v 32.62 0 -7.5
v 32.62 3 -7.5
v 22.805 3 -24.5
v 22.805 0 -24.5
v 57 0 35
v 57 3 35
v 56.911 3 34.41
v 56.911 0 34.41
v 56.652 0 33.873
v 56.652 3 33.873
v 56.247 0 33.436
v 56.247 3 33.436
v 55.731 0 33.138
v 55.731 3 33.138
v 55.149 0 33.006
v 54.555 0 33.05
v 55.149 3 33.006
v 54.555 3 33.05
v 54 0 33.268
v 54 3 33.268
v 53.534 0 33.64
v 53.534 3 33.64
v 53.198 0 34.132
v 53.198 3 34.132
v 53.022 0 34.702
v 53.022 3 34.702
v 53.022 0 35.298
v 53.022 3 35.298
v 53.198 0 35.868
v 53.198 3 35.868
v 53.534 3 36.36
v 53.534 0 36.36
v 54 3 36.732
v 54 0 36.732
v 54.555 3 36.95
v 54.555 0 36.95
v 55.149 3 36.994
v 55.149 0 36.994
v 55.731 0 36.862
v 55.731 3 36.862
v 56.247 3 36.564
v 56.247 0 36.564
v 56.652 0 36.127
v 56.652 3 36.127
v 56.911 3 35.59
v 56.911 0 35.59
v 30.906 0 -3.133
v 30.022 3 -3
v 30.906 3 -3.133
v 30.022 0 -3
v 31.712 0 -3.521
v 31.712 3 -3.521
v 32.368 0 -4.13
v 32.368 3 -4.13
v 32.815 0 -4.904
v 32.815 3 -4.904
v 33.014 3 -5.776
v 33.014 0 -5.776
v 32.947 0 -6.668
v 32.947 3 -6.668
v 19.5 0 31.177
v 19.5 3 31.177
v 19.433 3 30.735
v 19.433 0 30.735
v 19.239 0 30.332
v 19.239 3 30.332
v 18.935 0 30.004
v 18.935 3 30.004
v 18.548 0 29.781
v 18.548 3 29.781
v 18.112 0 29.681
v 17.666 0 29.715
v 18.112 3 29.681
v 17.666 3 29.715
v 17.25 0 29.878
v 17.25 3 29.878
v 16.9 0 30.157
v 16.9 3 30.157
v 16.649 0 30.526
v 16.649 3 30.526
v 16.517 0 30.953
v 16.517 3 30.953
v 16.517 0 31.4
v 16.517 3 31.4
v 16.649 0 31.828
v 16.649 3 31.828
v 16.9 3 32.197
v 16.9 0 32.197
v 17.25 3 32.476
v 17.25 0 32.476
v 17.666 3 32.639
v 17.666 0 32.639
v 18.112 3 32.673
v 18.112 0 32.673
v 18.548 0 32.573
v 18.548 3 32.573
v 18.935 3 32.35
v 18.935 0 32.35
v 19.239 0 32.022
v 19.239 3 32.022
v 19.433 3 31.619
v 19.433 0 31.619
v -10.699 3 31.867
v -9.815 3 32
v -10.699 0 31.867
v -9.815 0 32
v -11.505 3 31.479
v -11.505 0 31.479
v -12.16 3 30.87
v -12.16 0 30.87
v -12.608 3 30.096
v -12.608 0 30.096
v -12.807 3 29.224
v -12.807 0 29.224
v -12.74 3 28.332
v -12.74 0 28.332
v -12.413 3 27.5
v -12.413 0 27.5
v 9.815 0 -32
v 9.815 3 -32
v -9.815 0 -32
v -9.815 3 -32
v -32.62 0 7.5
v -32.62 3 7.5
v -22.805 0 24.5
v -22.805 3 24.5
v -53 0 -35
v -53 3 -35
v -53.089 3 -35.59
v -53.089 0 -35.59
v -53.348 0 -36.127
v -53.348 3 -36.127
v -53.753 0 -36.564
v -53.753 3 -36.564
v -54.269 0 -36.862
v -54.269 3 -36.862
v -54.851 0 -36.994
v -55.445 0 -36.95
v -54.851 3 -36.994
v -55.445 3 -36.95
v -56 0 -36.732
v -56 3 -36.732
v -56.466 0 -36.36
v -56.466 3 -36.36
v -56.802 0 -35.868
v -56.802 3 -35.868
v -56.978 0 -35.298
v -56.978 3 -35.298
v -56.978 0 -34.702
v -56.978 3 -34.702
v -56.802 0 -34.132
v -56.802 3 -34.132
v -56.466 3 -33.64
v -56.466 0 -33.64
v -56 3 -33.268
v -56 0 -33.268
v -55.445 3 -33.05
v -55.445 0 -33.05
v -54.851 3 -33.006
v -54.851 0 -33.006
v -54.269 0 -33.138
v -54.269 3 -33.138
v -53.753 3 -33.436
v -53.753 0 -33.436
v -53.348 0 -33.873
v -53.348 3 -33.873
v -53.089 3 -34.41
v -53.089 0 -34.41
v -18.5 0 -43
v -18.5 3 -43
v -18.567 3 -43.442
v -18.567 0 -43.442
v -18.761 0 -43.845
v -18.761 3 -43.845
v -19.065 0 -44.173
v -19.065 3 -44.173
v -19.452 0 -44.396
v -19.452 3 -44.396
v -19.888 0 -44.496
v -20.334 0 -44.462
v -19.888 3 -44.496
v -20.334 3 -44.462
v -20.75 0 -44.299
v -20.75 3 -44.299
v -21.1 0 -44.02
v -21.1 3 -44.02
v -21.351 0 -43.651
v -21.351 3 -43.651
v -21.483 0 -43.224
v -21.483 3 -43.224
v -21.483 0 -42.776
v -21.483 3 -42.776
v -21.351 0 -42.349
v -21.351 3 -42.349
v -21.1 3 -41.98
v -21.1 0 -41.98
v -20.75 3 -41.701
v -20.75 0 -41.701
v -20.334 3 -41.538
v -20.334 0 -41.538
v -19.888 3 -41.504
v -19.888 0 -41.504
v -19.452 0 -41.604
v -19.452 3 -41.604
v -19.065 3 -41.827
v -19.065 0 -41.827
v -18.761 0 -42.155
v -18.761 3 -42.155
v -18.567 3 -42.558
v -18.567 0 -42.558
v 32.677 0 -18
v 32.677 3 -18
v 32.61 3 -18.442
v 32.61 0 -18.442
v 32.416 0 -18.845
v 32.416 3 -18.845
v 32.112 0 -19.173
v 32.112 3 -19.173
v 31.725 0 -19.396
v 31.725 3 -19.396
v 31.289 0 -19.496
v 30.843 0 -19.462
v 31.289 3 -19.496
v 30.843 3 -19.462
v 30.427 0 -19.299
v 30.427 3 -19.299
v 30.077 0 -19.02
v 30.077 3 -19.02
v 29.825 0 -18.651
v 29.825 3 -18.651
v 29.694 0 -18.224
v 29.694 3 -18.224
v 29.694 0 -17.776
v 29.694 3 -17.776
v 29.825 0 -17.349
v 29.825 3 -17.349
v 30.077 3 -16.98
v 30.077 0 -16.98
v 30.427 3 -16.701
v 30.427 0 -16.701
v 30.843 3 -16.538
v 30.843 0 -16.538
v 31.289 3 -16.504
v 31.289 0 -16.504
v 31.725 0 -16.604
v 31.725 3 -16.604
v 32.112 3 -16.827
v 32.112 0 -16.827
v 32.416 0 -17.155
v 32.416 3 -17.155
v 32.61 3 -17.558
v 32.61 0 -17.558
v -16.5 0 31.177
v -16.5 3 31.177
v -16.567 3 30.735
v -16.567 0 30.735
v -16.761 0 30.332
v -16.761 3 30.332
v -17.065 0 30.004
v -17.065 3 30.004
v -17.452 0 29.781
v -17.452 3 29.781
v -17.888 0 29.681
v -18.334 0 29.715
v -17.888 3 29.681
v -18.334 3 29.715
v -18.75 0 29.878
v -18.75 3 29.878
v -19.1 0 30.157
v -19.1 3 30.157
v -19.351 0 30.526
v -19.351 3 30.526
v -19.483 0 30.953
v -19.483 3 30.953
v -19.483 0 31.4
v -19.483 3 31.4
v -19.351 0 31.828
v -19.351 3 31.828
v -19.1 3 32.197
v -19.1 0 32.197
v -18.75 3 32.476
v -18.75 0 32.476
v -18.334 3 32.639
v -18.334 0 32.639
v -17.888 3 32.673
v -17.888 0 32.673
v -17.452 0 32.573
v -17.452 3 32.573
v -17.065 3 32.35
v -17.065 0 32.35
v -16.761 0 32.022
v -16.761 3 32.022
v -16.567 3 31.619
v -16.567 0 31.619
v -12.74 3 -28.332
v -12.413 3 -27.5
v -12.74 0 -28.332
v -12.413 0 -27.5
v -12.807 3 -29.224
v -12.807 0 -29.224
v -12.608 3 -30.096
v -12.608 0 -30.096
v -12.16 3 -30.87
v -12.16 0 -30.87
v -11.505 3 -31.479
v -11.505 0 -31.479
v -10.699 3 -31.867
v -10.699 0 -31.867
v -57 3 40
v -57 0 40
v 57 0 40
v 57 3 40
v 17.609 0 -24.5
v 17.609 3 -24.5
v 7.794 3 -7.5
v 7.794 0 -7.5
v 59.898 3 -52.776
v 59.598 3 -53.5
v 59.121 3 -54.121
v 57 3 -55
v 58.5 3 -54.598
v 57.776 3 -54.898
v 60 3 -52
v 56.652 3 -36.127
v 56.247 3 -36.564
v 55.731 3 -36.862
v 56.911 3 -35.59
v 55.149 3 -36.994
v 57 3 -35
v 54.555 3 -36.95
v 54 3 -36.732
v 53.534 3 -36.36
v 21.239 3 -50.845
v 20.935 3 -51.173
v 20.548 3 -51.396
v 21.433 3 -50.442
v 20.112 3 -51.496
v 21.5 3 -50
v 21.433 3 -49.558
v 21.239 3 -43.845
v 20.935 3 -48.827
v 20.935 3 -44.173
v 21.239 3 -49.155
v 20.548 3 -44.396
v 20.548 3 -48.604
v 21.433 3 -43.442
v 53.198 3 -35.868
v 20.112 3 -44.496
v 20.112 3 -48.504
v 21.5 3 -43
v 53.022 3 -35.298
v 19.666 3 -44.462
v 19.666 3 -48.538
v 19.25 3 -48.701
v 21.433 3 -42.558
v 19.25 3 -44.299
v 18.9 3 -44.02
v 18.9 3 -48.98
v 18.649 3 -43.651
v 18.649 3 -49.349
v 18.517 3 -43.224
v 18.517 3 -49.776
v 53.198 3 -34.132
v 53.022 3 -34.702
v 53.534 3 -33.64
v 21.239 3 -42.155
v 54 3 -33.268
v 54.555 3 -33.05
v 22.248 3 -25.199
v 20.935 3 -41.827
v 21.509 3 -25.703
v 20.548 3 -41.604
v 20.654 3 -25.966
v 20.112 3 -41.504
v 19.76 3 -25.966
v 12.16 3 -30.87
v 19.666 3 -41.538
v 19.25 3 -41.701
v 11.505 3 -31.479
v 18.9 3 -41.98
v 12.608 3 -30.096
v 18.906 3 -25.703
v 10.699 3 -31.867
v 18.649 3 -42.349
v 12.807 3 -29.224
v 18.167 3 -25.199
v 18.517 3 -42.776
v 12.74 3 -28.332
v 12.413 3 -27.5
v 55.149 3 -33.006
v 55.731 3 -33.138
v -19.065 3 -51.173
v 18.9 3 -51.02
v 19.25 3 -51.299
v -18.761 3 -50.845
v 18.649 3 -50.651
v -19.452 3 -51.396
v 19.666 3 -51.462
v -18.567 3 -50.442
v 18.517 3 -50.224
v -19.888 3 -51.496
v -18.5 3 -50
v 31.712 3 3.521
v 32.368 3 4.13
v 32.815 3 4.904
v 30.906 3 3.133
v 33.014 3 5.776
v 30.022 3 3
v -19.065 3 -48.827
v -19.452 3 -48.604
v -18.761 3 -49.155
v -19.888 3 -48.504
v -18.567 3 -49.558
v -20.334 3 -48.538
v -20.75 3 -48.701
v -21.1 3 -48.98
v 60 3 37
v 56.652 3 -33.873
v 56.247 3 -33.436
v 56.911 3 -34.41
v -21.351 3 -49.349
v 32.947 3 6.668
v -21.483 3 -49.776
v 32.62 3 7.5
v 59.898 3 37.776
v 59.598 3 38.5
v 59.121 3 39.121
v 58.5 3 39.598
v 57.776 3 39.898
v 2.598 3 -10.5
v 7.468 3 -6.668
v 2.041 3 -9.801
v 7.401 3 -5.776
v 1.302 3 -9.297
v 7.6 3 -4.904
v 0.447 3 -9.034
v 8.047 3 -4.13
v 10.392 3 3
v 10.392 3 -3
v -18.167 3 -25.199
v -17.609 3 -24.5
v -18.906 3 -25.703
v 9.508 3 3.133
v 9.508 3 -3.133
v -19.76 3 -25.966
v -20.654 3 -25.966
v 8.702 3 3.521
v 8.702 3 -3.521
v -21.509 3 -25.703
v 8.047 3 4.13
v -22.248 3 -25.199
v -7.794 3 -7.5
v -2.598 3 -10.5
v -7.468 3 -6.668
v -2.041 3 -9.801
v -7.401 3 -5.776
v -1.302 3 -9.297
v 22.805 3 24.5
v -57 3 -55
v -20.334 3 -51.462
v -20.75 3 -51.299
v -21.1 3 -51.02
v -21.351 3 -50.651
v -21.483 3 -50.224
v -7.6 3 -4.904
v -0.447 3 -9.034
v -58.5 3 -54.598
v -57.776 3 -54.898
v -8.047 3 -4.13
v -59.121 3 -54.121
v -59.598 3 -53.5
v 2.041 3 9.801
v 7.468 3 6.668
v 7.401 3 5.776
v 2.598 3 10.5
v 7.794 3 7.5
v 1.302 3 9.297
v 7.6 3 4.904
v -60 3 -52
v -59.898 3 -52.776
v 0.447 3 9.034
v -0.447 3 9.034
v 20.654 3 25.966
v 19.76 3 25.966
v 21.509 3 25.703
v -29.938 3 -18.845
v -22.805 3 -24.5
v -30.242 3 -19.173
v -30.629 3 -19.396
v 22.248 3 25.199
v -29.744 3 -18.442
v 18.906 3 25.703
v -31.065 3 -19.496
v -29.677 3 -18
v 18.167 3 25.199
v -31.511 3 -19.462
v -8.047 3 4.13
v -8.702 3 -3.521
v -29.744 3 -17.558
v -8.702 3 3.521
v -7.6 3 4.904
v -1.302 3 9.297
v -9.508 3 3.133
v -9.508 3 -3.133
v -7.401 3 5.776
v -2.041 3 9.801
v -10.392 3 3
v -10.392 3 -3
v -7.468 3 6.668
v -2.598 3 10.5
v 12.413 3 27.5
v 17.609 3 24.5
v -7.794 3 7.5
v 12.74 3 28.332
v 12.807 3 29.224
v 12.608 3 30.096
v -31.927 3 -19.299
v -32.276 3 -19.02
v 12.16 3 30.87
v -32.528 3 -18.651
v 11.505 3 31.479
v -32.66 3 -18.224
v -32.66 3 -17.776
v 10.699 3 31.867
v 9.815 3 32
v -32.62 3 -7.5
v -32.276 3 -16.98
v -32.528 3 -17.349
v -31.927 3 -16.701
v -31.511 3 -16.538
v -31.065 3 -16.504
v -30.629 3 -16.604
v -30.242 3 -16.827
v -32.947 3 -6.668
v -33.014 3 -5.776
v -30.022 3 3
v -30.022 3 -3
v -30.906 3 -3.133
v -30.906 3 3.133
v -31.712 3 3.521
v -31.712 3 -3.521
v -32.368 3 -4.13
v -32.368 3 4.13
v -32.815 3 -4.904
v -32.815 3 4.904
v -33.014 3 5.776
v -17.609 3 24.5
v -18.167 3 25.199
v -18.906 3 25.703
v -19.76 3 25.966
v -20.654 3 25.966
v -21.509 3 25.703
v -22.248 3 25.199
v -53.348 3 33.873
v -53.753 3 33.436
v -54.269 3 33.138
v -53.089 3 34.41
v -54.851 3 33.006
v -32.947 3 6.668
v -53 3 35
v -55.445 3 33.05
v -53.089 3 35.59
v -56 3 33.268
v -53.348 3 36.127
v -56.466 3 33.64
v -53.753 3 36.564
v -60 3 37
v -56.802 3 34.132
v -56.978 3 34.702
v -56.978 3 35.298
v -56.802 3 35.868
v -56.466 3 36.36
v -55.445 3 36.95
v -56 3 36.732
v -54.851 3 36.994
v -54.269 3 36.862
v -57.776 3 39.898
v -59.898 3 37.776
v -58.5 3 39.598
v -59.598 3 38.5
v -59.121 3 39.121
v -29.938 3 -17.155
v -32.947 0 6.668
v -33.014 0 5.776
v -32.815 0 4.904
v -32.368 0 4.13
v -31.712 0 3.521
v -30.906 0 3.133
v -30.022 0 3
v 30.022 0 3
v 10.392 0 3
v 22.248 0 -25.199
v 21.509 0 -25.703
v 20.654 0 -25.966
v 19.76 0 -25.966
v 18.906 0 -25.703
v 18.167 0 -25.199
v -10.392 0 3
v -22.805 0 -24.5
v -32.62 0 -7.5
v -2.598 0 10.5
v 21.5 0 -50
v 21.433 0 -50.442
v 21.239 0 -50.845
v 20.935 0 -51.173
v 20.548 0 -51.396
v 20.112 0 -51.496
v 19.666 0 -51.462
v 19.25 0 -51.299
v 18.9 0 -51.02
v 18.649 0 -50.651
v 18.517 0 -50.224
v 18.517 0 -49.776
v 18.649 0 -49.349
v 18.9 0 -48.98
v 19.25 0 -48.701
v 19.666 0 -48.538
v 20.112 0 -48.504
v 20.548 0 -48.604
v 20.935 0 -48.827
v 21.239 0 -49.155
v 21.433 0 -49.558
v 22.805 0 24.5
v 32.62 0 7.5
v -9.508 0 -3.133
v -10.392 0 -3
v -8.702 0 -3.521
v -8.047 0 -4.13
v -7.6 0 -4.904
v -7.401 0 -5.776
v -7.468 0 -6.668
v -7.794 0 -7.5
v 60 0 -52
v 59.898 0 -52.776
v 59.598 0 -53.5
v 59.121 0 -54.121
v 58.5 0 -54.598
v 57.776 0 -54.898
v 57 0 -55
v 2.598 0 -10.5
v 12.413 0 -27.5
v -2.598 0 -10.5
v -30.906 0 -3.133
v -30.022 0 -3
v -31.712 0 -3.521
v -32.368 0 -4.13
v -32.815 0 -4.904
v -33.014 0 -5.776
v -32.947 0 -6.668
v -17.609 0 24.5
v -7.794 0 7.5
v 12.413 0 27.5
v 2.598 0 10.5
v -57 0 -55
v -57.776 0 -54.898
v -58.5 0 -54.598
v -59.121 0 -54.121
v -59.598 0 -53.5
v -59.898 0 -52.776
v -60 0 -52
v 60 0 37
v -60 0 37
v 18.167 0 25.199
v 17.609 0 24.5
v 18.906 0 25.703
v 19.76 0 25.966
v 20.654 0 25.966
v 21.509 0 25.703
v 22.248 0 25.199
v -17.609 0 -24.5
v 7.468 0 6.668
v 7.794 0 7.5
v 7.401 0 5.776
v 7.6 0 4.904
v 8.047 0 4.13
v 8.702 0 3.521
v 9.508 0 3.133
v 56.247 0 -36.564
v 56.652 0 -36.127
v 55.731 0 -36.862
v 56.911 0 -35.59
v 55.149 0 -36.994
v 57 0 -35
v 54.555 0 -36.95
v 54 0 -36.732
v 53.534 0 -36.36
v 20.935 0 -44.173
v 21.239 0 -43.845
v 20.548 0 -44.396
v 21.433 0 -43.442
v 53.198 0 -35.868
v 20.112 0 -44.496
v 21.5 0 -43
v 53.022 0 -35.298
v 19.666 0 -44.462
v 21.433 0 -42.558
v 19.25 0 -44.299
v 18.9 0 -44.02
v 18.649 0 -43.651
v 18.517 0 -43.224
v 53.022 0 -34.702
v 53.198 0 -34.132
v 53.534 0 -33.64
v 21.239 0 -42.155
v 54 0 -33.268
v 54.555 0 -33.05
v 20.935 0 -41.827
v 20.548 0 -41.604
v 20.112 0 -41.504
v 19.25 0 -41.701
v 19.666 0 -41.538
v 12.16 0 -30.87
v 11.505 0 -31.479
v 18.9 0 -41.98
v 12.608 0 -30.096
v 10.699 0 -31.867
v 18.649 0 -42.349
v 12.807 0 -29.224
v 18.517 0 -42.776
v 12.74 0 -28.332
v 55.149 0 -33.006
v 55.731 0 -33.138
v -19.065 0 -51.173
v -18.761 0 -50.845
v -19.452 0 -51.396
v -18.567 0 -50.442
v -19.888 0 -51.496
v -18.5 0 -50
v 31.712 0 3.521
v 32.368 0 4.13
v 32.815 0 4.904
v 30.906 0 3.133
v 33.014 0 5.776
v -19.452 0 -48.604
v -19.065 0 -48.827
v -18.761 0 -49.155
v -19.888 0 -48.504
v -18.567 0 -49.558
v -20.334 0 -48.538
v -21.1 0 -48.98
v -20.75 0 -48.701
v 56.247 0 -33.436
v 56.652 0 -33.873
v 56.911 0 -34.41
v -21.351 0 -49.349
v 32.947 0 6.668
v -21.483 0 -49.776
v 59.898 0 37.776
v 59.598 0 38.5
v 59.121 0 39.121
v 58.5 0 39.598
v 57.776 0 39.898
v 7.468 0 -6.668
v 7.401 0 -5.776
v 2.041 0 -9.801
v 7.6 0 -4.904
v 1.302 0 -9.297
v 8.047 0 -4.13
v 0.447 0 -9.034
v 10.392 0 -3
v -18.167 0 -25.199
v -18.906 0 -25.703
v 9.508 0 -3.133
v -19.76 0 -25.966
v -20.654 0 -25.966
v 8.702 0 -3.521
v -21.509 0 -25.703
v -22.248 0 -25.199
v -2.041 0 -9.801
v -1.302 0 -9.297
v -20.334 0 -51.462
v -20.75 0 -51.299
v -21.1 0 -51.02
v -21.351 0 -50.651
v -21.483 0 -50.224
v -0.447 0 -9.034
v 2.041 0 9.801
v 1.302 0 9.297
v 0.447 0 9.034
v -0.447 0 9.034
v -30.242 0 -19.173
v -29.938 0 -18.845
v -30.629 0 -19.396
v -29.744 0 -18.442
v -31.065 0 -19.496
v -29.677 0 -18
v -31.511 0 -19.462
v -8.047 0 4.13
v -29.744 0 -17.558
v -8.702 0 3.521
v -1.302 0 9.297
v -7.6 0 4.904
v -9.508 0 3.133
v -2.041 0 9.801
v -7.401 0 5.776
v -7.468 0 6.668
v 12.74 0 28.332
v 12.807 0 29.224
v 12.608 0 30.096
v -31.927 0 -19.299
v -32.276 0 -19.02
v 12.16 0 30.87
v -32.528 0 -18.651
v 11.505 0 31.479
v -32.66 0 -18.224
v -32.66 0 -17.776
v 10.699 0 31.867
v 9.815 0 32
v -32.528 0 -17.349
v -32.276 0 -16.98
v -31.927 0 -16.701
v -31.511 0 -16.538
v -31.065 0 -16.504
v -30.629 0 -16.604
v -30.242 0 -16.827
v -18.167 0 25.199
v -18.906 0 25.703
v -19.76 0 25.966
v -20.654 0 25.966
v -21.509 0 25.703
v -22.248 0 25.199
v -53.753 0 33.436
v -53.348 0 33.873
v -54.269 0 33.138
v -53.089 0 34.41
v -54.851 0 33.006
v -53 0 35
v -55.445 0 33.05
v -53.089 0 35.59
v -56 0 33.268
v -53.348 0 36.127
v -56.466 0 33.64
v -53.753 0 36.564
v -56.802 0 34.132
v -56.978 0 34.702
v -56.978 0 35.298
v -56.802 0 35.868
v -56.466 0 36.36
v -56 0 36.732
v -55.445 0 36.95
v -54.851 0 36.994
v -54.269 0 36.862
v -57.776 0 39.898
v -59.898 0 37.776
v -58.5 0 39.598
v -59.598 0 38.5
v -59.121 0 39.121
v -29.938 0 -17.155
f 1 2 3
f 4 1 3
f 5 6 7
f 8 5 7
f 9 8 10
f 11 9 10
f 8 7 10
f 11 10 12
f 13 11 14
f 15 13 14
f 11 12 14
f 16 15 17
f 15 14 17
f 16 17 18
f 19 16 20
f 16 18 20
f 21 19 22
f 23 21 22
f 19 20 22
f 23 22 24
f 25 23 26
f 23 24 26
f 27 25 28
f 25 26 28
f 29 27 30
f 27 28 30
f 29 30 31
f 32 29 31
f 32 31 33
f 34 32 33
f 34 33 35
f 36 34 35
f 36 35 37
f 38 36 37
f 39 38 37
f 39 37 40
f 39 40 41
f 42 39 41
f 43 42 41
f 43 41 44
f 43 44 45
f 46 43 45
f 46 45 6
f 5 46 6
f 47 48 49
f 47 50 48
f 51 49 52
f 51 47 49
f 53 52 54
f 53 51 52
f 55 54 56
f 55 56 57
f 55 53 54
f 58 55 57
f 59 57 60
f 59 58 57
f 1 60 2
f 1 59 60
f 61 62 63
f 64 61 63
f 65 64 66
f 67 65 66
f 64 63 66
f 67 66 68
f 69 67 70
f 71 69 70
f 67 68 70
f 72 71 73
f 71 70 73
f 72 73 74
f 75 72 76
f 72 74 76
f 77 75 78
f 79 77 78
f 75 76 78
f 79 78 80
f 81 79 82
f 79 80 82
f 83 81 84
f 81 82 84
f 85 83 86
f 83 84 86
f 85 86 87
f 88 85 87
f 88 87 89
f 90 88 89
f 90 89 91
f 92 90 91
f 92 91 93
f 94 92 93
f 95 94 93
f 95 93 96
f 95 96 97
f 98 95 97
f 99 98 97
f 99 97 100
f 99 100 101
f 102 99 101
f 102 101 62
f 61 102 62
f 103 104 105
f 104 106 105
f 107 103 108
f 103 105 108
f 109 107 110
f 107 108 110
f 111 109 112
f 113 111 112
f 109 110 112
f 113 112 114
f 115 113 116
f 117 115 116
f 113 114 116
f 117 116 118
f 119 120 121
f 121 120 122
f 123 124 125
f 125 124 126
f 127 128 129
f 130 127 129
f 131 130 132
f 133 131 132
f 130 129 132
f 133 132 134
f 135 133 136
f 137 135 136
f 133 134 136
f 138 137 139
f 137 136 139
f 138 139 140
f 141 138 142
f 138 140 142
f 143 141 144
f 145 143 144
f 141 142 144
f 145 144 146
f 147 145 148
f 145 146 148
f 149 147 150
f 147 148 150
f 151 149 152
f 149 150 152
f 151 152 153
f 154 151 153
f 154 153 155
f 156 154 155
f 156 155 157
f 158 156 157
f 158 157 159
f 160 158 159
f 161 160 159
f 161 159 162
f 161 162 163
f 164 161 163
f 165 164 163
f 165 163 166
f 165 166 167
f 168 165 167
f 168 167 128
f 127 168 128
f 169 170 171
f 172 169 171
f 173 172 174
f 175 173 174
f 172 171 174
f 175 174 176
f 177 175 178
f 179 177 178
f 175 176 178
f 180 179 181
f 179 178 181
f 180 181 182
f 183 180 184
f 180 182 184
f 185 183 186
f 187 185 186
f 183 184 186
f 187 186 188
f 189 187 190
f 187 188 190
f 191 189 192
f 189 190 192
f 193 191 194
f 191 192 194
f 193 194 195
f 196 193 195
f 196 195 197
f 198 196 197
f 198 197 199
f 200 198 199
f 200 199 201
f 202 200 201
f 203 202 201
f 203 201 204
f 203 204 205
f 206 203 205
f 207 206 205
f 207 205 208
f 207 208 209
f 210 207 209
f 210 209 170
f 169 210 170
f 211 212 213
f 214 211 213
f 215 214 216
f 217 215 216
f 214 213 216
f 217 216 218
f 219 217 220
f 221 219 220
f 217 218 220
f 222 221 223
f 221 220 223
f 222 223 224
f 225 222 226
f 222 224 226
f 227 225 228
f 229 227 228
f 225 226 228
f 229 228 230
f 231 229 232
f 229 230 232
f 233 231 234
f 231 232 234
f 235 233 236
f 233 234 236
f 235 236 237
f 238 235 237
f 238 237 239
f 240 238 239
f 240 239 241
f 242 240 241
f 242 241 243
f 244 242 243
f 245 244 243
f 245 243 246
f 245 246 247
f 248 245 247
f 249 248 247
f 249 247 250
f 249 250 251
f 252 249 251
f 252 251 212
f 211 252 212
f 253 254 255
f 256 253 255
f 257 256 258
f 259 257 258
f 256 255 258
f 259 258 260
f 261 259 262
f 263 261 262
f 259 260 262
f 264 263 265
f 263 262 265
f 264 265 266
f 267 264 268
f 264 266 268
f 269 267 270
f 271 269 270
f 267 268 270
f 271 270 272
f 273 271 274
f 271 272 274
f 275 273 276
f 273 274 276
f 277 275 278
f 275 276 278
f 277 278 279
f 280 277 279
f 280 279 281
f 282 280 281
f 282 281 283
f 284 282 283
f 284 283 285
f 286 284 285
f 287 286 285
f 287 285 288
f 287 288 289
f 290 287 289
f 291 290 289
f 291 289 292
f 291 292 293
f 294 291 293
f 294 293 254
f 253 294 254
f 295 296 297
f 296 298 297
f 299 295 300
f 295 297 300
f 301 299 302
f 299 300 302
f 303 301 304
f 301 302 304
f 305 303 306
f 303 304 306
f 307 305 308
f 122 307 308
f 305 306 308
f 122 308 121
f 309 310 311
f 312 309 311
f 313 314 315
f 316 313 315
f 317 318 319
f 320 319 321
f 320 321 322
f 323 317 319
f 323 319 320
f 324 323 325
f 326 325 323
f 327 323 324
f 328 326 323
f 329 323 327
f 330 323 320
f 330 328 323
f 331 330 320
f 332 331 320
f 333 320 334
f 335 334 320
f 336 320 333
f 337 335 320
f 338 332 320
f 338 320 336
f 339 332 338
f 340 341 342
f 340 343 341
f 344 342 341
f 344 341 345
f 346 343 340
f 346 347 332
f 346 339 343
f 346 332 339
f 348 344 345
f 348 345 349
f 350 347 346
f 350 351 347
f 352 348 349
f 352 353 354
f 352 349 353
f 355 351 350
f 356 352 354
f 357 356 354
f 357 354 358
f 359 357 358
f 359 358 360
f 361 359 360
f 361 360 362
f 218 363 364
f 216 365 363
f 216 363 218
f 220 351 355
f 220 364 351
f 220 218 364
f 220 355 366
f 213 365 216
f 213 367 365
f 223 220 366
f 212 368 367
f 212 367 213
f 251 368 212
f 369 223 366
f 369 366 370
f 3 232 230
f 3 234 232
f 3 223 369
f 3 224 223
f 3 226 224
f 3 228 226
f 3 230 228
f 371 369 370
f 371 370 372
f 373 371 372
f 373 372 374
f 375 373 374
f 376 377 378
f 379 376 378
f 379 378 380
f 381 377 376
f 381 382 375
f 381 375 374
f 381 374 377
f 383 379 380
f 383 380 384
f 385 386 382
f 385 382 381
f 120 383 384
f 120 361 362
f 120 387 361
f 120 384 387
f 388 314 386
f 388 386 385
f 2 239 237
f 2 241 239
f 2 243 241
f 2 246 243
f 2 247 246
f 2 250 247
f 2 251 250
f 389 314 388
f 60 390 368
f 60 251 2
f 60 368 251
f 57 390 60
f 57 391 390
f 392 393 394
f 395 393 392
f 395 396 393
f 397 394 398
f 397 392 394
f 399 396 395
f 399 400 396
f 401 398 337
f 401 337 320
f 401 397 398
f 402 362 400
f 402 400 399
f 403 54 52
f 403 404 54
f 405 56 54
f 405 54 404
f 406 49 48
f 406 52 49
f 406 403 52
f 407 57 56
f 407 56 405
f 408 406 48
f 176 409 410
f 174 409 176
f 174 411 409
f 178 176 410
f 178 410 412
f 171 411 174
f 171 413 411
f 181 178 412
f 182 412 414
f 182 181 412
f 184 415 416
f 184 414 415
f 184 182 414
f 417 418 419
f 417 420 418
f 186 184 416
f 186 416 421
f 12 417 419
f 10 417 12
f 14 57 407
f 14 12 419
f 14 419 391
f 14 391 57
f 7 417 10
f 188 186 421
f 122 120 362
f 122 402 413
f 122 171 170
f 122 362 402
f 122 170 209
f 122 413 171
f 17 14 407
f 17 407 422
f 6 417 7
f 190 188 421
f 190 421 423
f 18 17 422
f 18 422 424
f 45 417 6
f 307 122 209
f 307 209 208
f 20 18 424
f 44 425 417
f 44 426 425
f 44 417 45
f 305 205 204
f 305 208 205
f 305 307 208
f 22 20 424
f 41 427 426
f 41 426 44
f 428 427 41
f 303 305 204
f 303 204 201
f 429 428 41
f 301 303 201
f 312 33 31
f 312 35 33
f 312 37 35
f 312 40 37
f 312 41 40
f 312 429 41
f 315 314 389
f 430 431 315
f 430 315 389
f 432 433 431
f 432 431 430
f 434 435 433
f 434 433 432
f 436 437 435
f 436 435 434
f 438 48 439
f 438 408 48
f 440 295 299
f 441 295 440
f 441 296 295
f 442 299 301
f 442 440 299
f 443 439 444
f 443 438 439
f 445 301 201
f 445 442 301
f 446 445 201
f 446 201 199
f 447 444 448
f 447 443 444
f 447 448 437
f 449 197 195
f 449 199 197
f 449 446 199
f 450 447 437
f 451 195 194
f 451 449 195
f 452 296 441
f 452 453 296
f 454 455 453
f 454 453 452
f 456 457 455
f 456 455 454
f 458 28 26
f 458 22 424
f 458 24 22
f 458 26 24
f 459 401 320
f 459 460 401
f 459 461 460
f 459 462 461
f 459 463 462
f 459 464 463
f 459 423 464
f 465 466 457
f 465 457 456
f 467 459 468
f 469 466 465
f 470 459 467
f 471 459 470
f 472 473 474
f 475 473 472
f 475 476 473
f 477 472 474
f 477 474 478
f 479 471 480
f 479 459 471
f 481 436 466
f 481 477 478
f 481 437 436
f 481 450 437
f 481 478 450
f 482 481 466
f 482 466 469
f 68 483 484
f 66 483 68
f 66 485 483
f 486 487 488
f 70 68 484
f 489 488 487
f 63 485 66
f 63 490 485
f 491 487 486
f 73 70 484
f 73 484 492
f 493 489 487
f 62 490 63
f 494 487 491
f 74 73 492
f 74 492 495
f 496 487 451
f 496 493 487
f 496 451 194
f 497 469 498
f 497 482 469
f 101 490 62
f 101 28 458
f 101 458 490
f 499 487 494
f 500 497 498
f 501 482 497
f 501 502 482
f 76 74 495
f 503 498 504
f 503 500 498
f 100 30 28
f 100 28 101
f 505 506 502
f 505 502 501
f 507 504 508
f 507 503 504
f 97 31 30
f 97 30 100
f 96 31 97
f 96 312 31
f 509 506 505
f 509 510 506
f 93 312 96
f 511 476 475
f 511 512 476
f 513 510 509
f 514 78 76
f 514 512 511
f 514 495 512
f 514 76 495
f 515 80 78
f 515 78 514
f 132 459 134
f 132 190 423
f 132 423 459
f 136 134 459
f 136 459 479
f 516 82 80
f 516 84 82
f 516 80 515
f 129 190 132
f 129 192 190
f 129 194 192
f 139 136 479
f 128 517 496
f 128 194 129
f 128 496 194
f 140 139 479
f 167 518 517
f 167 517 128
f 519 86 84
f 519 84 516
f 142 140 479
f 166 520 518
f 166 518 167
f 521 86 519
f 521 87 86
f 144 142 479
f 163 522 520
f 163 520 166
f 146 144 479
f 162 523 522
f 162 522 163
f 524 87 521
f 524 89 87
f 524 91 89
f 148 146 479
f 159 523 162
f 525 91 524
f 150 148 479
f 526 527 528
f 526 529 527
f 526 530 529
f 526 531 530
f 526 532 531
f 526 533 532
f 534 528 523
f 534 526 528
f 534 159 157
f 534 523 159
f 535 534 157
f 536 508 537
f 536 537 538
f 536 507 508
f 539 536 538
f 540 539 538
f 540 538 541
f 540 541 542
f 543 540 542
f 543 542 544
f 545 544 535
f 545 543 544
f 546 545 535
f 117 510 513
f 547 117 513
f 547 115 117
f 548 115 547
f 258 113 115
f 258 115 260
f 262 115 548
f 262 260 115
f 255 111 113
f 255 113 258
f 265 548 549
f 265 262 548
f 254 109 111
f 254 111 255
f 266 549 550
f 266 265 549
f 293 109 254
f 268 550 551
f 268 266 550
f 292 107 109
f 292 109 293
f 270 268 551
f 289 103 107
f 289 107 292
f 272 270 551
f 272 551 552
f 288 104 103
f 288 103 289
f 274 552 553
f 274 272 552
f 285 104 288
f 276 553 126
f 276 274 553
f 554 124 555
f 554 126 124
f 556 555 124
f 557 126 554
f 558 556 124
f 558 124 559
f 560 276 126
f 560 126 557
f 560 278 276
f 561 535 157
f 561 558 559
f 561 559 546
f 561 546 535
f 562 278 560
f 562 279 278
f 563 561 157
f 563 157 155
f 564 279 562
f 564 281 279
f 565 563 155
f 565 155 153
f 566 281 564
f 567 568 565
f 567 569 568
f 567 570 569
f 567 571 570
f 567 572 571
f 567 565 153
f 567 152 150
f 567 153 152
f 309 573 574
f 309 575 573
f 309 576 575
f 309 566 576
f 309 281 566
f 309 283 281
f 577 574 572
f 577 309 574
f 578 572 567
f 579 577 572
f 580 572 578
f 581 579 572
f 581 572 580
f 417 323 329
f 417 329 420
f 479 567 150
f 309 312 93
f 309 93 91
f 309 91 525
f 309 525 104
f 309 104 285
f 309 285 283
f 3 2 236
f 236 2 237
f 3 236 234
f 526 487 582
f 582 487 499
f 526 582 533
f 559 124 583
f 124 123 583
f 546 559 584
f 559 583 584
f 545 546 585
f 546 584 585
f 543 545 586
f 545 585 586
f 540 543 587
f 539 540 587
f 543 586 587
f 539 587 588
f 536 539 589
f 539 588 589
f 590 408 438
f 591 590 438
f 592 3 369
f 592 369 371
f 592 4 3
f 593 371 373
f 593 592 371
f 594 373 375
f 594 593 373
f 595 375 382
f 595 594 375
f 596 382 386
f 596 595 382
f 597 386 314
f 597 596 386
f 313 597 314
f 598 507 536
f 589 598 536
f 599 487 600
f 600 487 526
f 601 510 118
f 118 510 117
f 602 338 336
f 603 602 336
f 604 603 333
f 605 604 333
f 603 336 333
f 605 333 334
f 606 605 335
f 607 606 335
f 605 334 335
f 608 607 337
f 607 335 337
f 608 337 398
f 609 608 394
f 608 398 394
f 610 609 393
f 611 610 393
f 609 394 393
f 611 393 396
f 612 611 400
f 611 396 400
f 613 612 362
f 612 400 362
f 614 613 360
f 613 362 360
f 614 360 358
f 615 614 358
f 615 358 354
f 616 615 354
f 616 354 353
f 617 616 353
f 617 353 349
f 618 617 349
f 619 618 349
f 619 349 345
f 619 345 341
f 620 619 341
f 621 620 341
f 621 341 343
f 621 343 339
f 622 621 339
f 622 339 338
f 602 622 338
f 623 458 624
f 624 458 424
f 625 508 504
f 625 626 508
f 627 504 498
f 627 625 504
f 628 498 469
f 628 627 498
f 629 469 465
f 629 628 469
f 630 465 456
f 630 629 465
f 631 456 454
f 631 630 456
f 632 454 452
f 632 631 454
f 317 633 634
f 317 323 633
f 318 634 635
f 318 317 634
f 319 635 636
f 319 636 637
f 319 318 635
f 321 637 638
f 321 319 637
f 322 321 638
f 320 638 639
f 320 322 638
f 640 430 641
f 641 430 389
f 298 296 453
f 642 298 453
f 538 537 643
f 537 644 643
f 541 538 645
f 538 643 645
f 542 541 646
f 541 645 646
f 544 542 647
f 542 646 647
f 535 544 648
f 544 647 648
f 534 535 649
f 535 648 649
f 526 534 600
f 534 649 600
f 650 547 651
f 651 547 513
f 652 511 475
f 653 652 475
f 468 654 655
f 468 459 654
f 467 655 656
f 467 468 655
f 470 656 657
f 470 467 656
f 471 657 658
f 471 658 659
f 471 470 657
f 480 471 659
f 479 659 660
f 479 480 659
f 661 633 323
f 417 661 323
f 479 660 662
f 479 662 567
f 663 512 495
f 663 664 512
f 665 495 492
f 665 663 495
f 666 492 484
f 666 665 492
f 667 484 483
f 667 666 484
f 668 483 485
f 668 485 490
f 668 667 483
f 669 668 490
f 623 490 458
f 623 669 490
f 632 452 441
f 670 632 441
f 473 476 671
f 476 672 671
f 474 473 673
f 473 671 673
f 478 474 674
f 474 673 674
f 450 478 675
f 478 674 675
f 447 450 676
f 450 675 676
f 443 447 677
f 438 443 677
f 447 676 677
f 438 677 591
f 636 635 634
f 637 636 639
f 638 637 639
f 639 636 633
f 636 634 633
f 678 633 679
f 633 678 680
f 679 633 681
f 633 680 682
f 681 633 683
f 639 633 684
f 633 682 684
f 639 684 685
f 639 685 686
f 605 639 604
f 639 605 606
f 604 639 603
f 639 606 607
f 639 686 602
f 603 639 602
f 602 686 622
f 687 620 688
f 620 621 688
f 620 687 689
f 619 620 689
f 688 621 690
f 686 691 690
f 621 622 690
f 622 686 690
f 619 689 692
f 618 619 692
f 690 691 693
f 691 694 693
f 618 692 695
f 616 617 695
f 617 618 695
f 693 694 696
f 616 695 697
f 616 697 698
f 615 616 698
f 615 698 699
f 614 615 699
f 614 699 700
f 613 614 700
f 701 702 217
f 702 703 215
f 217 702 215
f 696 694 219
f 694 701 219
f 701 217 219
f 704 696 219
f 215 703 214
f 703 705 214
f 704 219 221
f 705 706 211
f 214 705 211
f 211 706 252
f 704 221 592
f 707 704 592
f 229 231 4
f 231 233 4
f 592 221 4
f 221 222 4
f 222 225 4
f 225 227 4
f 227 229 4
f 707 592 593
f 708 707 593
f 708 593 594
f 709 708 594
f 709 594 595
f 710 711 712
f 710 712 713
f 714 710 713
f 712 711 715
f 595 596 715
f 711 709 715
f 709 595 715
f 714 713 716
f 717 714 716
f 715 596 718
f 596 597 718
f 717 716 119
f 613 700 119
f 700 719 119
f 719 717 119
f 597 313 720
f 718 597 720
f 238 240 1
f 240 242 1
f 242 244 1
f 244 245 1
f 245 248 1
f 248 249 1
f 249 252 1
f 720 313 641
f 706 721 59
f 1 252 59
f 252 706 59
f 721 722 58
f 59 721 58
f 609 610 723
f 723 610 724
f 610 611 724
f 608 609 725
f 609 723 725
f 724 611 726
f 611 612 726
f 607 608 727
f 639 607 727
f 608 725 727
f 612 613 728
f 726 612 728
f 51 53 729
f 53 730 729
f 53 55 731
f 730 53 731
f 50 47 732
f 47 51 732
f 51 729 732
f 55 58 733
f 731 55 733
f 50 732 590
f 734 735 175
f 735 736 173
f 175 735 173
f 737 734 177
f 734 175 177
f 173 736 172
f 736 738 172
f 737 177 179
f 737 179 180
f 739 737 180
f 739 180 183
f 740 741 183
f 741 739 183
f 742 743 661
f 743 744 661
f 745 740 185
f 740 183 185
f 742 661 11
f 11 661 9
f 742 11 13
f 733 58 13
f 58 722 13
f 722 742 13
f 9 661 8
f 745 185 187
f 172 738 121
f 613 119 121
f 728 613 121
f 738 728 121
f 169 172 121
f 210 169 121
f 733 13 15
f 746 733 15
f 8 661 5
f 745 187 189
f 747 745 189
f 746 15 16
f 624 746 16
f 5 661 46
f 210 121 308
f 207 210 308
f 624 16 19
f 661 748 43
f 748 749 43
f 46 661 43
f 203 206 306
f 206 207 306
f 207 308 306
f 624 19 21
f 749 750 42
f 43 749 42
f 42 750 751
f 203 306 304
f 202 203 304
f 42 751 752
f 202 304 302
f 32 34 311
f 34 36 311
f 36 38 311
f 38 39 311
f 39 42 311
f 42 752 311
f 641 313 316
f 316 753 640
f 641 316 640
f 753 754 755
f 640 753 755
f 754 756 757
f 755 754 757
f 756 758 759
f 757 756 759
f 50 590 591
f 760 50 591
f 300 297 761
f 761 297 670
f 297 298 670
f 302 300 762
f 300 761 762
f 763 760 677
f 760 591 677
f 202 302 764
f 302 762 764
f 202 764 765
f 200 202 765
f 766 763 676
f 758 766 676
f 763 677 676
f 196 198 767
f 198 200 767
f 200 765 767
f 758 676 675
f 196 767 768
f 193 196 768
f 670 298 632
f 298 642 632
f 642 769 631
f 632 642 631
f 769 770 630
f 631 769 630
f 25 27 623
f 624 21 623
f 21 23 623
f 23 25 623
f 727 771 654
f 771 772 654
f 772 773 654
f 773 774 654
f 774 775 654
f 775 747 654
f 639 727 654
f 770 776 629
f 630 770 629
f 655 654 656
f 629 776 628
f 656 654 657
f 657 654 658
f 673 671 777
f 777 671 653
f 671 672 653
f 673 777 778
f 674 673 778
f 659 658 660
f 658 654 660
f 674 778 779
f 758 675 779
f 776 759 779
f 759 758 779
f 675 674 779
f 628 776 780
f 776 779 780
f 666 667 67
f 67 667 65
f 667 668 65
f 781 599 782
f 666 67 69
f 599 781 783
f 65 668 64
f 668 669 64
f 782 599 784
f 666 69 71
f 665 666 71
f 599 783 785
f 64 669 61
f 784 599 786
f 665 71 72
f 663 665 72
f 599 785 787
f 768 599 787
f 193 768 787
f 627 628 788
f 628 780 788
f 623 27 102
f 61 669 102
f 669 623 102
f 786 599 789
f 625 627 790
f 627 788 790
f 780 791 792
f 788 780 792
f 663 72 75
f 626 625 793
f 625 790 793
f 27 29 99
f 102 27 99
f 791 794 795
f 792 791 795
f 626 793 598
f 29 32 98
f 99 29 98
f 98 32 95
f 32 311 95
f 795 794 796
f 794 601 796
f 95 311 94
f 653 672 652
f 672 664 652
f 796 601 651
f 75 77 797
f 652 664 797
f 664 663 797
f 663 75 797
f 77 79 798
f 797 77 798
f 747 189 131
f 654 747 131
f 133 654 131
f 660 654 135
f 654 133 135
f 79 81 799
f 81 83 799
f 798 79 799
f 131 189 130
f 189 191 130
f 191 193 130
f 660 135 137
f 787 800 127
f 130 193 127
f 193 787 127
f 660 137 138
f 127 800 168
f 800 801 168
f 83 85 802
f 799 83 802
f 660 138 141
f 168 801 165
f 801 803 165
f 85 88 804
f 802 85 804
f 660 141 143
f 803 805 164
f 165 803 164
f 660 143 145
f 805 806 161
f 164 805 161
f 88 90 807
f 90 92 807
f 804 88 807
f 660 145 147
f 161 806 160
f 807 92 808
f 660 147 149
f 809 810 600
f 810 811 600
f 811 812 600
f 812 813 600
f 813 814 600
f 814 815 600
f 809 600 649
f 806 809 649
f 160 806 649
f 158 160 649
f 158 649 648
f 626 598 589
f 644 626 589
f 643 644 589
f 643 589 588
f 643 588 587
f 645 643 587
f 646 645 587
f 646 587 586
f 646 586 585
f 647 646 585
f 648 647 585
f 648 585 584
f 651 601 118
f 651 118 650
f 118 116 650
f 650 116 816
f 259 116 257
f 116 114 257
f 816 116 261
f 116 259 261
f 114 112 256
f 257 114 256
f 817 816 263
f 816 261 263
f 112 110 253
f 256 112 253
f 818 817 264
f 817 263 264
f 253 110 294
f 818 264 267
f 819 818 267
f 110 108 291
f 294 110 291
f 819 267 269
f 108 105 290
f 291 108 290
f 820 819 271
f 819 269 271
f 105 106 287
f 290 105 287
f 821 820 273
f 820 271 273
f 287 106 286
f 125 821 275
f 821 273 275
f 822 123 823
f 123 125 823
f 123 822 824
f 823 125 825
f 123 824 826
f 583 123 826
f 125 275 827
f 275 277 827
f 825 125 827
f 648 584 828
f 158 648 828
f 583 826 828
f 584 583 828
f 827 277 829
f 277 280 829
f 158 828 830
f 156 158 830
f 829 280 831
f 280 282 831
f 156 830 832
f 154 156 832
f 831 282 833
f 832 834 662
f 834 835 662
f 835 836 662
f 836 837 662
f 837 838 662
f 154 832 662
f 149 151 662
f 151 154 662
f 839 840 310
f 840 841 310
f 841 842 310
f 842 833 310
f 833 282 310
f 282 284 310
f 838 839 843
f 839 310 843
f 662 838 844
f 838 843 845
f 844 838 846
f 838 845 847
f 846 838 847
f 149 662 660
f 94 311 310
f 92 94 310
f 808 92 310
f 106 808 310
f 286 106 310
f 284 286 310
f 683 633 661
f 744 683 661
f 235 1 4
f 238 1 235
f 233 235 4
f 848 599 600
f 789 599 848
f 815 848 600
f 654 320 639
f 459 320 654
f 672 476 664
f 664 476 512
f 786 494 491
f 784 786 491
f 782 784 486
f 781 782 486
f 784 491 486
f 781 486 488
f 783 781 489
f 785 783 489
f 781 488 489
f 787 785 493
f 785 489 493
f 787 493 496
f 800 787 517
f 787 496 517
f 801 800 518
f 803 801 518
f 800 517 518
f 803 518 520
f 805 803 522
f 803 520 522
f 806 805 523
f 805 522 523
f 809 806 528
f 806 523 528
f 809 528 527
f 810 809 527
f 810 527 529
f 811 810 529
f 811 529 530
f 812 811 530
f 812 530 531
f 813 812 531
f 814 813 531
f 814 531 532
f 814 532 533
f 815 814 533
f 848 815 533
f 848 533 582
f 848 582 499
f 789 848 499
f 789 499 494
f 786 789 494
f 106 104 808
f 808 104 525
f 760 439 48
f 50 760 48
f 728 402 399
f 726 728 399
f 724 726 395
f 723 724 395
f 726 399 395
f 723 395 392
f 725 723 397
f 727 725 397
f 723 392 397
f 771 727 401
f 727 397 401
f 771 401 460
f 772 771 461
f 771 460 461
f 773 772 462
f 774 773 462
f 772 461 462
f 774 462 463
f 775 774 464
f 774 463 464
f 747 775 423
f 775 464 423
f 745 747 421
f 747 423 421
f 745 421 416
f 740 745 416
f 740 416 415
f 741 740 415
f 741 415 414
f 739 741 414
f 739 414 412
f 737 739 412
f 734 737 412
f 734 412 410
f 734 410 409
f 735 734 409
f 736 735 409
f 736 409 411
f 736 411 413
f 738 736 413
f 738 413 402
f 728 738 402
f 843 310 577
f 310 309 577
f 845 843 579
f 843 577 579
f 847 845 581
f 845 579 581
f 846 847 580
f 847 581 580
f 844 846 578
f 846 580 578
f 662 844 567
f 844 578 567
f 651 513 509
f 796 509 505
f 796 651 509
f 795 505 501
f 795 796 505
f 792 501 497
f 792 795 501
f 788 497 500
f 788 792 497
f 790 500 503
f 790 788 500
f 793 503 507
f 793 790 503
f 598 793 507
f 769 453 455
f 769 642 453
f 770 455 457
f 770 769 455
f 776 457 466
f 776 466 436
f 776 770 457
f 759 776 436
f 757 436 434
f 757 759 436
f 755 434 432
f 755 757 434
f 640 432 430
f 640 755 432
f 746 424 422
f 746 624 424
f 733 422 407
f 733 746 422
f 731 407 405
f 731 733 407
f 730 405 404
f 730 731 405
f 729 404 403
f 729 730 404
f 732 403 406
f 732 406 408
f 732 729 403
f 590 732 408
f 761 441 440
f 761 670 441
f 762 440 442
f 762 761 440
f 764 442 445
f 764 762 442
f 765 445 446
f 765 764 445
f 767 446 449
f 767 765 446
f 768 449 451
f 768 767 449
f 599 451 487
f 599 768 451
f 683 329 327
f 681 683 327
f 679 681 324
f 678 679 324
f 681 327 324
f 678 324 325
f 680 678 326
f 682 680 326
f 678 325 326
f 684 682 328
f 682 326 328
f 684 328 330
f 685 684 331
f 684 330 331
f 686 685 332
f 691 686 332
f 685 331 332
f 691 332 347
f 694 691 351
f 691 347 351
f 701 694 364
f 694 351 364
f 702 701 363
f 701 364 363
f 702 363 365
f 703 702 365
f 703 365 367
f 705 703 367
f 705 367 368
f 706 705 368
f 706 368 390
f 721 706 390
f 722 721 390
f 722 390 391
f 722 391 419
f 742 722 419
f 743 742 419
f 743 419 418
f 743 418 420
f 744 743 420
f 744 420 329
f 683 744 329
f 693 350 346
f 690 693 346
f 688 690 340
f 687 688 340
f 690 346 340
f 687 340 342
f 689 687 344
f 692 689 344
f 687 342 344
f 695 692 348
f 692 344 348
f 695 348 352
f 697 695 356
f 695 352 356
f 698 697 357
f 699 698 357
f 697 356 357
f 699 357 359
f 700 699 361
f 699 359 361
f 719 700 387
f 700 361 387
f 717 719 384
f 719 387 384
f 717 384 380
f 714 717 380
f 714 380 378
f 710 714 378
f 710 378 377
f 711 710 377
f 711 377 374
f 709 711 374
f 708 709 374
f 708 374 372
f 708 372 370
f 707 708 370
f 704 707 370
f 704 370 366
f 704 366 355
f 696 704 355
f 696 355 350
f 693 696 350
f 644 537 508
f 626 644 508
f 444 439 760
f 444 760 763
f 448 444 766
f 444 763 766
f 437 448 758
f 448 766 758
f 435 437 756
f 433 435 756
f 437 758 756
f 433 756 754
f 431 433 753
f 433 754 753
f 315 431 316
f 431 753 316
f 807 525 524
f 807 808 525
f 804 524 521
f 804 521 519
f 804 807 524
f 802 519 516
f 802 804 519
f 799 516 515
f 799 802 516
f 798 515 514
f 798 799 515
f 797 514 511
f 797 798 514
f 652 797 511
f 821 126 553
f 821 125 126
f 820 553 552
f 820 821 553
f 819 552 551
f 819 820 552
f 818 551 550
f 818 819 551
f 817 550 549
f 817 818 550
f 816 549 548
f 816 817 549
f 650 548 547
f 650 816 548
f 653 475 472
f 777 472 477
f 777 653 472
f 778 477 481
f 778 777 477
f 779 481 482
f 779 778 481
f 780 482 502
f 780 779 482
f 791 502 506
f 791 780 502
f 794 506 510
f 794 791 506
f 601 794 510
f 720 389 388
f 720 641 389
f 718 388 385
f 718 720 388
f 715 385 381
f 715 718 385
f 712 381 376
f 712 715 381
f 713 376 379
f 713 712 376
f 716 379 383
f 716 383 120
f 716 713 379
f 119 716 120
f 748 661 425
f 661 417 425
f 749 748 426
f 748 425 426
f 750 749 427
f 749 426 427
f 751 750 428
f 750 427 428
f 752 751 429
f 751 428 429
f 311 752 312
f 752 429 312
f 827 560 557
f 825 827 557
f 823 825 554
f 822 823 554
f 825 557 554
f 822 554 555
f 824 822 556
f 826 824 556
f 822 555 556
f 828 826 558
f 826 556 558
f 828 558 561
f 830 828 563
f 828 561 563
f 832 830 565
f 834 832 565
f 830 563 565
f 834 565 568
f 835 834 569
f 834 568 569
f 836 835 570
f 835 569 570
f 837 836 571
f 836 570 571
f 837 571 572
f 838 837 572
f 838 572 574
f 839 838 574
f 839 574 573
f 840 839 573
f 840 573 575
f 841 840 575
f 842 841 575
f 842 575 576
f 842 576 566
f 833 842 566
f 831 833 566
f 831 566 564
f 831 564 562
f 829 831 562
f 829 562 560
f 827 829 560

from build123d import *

# Parameters (mm, degrees)
SKETCH_1_W          = 120
SKETCH_1_H          = 80
EXTRUDE_1_DEPTH     = 3
SKETCH_3_R          = 1.5
CUT_EXTRUDE_2_DEPTH = 4
SKETCH_4_R          = 2
CUT_EXTRUDE_3_DEPTH = 4
SKETCH_5_W          = 120
SKETCH_5_H          = 3
EXTRUDE_2_DEPTH     = 15
CUT_EXTRUDE_4_DEPTH = 15
FILLET_1_R          = 3
SKETCH_7_R          = 1.5
CUT_EXTRUDE_5_DEPTH = 4
FILLET_2_R          = 3


with BuildPart() as part:
    # 草图1 → 凸台-拉伸1 (new body)
    with BuildSketch(Plane(origin=(0, 0, 0), x_dir=(1, 0, 0), z_dir=(0, 1, 0))):
        Rectangle(SKETCH_1_W, SKETCH_1_H)
    extrude(amount=EXTRUDE_1_DEPTH)

    # 草图3 → 切除-拉伸2 (cut, through all)
    with BuildSketch(Plane(origin=(0, 3, 0), x_dir=(1, 0, 0), z_dir=(0, 1, 0))):
        with Locations((-31.176914536, 18)):
            Circle(SKETCH_3_R)
        with Locations((31.176914536, 18)):
            Circle(SKETCH_3_R)
        with Locations((-18, -31.176914536)):
            Circle(SKETCH_3_R)
        with Locations((18, -31.176914536)):
            Circle(SKETCH_3_R)
    extrude(amount=-CUT_EXTRUDE_2_DEPTH, mode=Mode.SUBTRACT)

    # 草图4 → 切除-拉伸3 (cut, through all)
    with BuildSketch(Plane(origin=(0, 3, 0), x_dir=(1, 0, 0), z_dir=(0, 1, 0))):
        with Locations((-55, 35)):
            Circle(SKETCH_4_R)
        with Locations((55, 35)):
            Circle(SKETCH_4_R)
        with Locations((55, -35)):
            Circle(SKETCH_4_R)
        with Locations((-55, -35)):
            Circle(SKETCH_4_R)
    extrude(amount=-CUT_EXTRUDE_3_DEPTH, mode=Mode.SUBTRACT)

    # 草图5 → 凸台-拉伸2 (add)
    with BuildSketch(Plane(origin=(0, 0, -40), x_dir=(-1, 0, 0), z_dir=(0, 0, -1))):
        with Locations((0, 1.5)):
            Rectangle(SKETCH_5_W, SKETCH_5_H)
    extrude(amount=EXTRUDE_2_DEPTH)

    # 草图6 → 切除-拉伸4 (cut)
    with BuildSketch(Plane(origin=(0, 3, 0), x_dir=(1, 0, 0), z_dir=(0, 1, 0))):
        Polygon((-15.011106999, 32), (0, 6), (15.011106999, 32), align=None)
        Polygon((5.196152423, 3), (35.218366421, 3), (20.207259422, 29), align=None)
        Polygon((5.196152423, -3), (20.207259422, -29), (35.218366421, -3), align=None)
        Polygon((-15.011106999, -32), (15.011106999, -32), (0, -6), align=None)
        Polygon((-35.218366421, -3), (-20.207259422, -29), (-5.196152423, -3), align=None)
        Polygon((-35.218366421, 3), (-5.196152423, 3), (-20.207259422, 29), align=None)
    extrude(amount=-CUT_EXTRUDE_4_DEPTH, mode=Mode.SUBTRACT)

    # 圆角1
    fillet_1_edges = [part.edges().sort_by_distance(p)[0] for p in [
        (35.218366421, 1.5, -3),
        (5.196152423, 1.5, -3),
        (20.207259422, 1.5, -29),
        (-20.207259422, 1.5, -29),
        (-5.196152423, 1.5, -3),
        (-35.218366421, 1.5, -3),
        (15.011106999, 1.5, -32),
        (0, 1.5, -6),
        (-15.011106999, 1.5, -32),
        (-15.011106999, 1.5, 32),
        (0, 1.5, 6),
        (15.011106999, 1.5, 32),
        (-35.218366421, 1.5, 3),
        (-5.196152423, 1.5, 3),
        (-20.207259422, 1.5, 29),
        (20.207259422, 1.5, 29),
        (5.196152423, 1.5, 3),
        (35.218366421, 1.5, 3),
    ]]
    fillet(fillet_1_edges, radius=FILLET_1_R)

    # 草图7 → 切除-拉伸5 (cut, through all)
    with BuildSketch(Plane(origin=(0, 3, 0), x_dir=(1, 0, 0), z_dir=(0, 1, 0))):
        with Locations((-20, 50)):
            Circle(SKETCH_7_R)
        with Locations((20, 50)):
            Circle(SKETCH_7_R)
        with Locations((-20, 43)):
            Circle(SKETCH_7_R)
        with Locations((20, 43)):
            Circle(SKETCH_7_R)
    extrude(amount=-CUT_EXTRUDE_5_DEPTH, mode=Mode.SUBTRACT)

    # 圆角2
    fillet_2_edges = [part.edges().sort_by_distance(p)[0] for p in [
        (60, 1.5, -55),
        (-60, 1.5, -55),
        (60, 1.5, 40),
        (-60, 1.5, 40),
    ]]
    fillet(fillet_2_edges, radius=FILLET_2_R)


solid = part.part
